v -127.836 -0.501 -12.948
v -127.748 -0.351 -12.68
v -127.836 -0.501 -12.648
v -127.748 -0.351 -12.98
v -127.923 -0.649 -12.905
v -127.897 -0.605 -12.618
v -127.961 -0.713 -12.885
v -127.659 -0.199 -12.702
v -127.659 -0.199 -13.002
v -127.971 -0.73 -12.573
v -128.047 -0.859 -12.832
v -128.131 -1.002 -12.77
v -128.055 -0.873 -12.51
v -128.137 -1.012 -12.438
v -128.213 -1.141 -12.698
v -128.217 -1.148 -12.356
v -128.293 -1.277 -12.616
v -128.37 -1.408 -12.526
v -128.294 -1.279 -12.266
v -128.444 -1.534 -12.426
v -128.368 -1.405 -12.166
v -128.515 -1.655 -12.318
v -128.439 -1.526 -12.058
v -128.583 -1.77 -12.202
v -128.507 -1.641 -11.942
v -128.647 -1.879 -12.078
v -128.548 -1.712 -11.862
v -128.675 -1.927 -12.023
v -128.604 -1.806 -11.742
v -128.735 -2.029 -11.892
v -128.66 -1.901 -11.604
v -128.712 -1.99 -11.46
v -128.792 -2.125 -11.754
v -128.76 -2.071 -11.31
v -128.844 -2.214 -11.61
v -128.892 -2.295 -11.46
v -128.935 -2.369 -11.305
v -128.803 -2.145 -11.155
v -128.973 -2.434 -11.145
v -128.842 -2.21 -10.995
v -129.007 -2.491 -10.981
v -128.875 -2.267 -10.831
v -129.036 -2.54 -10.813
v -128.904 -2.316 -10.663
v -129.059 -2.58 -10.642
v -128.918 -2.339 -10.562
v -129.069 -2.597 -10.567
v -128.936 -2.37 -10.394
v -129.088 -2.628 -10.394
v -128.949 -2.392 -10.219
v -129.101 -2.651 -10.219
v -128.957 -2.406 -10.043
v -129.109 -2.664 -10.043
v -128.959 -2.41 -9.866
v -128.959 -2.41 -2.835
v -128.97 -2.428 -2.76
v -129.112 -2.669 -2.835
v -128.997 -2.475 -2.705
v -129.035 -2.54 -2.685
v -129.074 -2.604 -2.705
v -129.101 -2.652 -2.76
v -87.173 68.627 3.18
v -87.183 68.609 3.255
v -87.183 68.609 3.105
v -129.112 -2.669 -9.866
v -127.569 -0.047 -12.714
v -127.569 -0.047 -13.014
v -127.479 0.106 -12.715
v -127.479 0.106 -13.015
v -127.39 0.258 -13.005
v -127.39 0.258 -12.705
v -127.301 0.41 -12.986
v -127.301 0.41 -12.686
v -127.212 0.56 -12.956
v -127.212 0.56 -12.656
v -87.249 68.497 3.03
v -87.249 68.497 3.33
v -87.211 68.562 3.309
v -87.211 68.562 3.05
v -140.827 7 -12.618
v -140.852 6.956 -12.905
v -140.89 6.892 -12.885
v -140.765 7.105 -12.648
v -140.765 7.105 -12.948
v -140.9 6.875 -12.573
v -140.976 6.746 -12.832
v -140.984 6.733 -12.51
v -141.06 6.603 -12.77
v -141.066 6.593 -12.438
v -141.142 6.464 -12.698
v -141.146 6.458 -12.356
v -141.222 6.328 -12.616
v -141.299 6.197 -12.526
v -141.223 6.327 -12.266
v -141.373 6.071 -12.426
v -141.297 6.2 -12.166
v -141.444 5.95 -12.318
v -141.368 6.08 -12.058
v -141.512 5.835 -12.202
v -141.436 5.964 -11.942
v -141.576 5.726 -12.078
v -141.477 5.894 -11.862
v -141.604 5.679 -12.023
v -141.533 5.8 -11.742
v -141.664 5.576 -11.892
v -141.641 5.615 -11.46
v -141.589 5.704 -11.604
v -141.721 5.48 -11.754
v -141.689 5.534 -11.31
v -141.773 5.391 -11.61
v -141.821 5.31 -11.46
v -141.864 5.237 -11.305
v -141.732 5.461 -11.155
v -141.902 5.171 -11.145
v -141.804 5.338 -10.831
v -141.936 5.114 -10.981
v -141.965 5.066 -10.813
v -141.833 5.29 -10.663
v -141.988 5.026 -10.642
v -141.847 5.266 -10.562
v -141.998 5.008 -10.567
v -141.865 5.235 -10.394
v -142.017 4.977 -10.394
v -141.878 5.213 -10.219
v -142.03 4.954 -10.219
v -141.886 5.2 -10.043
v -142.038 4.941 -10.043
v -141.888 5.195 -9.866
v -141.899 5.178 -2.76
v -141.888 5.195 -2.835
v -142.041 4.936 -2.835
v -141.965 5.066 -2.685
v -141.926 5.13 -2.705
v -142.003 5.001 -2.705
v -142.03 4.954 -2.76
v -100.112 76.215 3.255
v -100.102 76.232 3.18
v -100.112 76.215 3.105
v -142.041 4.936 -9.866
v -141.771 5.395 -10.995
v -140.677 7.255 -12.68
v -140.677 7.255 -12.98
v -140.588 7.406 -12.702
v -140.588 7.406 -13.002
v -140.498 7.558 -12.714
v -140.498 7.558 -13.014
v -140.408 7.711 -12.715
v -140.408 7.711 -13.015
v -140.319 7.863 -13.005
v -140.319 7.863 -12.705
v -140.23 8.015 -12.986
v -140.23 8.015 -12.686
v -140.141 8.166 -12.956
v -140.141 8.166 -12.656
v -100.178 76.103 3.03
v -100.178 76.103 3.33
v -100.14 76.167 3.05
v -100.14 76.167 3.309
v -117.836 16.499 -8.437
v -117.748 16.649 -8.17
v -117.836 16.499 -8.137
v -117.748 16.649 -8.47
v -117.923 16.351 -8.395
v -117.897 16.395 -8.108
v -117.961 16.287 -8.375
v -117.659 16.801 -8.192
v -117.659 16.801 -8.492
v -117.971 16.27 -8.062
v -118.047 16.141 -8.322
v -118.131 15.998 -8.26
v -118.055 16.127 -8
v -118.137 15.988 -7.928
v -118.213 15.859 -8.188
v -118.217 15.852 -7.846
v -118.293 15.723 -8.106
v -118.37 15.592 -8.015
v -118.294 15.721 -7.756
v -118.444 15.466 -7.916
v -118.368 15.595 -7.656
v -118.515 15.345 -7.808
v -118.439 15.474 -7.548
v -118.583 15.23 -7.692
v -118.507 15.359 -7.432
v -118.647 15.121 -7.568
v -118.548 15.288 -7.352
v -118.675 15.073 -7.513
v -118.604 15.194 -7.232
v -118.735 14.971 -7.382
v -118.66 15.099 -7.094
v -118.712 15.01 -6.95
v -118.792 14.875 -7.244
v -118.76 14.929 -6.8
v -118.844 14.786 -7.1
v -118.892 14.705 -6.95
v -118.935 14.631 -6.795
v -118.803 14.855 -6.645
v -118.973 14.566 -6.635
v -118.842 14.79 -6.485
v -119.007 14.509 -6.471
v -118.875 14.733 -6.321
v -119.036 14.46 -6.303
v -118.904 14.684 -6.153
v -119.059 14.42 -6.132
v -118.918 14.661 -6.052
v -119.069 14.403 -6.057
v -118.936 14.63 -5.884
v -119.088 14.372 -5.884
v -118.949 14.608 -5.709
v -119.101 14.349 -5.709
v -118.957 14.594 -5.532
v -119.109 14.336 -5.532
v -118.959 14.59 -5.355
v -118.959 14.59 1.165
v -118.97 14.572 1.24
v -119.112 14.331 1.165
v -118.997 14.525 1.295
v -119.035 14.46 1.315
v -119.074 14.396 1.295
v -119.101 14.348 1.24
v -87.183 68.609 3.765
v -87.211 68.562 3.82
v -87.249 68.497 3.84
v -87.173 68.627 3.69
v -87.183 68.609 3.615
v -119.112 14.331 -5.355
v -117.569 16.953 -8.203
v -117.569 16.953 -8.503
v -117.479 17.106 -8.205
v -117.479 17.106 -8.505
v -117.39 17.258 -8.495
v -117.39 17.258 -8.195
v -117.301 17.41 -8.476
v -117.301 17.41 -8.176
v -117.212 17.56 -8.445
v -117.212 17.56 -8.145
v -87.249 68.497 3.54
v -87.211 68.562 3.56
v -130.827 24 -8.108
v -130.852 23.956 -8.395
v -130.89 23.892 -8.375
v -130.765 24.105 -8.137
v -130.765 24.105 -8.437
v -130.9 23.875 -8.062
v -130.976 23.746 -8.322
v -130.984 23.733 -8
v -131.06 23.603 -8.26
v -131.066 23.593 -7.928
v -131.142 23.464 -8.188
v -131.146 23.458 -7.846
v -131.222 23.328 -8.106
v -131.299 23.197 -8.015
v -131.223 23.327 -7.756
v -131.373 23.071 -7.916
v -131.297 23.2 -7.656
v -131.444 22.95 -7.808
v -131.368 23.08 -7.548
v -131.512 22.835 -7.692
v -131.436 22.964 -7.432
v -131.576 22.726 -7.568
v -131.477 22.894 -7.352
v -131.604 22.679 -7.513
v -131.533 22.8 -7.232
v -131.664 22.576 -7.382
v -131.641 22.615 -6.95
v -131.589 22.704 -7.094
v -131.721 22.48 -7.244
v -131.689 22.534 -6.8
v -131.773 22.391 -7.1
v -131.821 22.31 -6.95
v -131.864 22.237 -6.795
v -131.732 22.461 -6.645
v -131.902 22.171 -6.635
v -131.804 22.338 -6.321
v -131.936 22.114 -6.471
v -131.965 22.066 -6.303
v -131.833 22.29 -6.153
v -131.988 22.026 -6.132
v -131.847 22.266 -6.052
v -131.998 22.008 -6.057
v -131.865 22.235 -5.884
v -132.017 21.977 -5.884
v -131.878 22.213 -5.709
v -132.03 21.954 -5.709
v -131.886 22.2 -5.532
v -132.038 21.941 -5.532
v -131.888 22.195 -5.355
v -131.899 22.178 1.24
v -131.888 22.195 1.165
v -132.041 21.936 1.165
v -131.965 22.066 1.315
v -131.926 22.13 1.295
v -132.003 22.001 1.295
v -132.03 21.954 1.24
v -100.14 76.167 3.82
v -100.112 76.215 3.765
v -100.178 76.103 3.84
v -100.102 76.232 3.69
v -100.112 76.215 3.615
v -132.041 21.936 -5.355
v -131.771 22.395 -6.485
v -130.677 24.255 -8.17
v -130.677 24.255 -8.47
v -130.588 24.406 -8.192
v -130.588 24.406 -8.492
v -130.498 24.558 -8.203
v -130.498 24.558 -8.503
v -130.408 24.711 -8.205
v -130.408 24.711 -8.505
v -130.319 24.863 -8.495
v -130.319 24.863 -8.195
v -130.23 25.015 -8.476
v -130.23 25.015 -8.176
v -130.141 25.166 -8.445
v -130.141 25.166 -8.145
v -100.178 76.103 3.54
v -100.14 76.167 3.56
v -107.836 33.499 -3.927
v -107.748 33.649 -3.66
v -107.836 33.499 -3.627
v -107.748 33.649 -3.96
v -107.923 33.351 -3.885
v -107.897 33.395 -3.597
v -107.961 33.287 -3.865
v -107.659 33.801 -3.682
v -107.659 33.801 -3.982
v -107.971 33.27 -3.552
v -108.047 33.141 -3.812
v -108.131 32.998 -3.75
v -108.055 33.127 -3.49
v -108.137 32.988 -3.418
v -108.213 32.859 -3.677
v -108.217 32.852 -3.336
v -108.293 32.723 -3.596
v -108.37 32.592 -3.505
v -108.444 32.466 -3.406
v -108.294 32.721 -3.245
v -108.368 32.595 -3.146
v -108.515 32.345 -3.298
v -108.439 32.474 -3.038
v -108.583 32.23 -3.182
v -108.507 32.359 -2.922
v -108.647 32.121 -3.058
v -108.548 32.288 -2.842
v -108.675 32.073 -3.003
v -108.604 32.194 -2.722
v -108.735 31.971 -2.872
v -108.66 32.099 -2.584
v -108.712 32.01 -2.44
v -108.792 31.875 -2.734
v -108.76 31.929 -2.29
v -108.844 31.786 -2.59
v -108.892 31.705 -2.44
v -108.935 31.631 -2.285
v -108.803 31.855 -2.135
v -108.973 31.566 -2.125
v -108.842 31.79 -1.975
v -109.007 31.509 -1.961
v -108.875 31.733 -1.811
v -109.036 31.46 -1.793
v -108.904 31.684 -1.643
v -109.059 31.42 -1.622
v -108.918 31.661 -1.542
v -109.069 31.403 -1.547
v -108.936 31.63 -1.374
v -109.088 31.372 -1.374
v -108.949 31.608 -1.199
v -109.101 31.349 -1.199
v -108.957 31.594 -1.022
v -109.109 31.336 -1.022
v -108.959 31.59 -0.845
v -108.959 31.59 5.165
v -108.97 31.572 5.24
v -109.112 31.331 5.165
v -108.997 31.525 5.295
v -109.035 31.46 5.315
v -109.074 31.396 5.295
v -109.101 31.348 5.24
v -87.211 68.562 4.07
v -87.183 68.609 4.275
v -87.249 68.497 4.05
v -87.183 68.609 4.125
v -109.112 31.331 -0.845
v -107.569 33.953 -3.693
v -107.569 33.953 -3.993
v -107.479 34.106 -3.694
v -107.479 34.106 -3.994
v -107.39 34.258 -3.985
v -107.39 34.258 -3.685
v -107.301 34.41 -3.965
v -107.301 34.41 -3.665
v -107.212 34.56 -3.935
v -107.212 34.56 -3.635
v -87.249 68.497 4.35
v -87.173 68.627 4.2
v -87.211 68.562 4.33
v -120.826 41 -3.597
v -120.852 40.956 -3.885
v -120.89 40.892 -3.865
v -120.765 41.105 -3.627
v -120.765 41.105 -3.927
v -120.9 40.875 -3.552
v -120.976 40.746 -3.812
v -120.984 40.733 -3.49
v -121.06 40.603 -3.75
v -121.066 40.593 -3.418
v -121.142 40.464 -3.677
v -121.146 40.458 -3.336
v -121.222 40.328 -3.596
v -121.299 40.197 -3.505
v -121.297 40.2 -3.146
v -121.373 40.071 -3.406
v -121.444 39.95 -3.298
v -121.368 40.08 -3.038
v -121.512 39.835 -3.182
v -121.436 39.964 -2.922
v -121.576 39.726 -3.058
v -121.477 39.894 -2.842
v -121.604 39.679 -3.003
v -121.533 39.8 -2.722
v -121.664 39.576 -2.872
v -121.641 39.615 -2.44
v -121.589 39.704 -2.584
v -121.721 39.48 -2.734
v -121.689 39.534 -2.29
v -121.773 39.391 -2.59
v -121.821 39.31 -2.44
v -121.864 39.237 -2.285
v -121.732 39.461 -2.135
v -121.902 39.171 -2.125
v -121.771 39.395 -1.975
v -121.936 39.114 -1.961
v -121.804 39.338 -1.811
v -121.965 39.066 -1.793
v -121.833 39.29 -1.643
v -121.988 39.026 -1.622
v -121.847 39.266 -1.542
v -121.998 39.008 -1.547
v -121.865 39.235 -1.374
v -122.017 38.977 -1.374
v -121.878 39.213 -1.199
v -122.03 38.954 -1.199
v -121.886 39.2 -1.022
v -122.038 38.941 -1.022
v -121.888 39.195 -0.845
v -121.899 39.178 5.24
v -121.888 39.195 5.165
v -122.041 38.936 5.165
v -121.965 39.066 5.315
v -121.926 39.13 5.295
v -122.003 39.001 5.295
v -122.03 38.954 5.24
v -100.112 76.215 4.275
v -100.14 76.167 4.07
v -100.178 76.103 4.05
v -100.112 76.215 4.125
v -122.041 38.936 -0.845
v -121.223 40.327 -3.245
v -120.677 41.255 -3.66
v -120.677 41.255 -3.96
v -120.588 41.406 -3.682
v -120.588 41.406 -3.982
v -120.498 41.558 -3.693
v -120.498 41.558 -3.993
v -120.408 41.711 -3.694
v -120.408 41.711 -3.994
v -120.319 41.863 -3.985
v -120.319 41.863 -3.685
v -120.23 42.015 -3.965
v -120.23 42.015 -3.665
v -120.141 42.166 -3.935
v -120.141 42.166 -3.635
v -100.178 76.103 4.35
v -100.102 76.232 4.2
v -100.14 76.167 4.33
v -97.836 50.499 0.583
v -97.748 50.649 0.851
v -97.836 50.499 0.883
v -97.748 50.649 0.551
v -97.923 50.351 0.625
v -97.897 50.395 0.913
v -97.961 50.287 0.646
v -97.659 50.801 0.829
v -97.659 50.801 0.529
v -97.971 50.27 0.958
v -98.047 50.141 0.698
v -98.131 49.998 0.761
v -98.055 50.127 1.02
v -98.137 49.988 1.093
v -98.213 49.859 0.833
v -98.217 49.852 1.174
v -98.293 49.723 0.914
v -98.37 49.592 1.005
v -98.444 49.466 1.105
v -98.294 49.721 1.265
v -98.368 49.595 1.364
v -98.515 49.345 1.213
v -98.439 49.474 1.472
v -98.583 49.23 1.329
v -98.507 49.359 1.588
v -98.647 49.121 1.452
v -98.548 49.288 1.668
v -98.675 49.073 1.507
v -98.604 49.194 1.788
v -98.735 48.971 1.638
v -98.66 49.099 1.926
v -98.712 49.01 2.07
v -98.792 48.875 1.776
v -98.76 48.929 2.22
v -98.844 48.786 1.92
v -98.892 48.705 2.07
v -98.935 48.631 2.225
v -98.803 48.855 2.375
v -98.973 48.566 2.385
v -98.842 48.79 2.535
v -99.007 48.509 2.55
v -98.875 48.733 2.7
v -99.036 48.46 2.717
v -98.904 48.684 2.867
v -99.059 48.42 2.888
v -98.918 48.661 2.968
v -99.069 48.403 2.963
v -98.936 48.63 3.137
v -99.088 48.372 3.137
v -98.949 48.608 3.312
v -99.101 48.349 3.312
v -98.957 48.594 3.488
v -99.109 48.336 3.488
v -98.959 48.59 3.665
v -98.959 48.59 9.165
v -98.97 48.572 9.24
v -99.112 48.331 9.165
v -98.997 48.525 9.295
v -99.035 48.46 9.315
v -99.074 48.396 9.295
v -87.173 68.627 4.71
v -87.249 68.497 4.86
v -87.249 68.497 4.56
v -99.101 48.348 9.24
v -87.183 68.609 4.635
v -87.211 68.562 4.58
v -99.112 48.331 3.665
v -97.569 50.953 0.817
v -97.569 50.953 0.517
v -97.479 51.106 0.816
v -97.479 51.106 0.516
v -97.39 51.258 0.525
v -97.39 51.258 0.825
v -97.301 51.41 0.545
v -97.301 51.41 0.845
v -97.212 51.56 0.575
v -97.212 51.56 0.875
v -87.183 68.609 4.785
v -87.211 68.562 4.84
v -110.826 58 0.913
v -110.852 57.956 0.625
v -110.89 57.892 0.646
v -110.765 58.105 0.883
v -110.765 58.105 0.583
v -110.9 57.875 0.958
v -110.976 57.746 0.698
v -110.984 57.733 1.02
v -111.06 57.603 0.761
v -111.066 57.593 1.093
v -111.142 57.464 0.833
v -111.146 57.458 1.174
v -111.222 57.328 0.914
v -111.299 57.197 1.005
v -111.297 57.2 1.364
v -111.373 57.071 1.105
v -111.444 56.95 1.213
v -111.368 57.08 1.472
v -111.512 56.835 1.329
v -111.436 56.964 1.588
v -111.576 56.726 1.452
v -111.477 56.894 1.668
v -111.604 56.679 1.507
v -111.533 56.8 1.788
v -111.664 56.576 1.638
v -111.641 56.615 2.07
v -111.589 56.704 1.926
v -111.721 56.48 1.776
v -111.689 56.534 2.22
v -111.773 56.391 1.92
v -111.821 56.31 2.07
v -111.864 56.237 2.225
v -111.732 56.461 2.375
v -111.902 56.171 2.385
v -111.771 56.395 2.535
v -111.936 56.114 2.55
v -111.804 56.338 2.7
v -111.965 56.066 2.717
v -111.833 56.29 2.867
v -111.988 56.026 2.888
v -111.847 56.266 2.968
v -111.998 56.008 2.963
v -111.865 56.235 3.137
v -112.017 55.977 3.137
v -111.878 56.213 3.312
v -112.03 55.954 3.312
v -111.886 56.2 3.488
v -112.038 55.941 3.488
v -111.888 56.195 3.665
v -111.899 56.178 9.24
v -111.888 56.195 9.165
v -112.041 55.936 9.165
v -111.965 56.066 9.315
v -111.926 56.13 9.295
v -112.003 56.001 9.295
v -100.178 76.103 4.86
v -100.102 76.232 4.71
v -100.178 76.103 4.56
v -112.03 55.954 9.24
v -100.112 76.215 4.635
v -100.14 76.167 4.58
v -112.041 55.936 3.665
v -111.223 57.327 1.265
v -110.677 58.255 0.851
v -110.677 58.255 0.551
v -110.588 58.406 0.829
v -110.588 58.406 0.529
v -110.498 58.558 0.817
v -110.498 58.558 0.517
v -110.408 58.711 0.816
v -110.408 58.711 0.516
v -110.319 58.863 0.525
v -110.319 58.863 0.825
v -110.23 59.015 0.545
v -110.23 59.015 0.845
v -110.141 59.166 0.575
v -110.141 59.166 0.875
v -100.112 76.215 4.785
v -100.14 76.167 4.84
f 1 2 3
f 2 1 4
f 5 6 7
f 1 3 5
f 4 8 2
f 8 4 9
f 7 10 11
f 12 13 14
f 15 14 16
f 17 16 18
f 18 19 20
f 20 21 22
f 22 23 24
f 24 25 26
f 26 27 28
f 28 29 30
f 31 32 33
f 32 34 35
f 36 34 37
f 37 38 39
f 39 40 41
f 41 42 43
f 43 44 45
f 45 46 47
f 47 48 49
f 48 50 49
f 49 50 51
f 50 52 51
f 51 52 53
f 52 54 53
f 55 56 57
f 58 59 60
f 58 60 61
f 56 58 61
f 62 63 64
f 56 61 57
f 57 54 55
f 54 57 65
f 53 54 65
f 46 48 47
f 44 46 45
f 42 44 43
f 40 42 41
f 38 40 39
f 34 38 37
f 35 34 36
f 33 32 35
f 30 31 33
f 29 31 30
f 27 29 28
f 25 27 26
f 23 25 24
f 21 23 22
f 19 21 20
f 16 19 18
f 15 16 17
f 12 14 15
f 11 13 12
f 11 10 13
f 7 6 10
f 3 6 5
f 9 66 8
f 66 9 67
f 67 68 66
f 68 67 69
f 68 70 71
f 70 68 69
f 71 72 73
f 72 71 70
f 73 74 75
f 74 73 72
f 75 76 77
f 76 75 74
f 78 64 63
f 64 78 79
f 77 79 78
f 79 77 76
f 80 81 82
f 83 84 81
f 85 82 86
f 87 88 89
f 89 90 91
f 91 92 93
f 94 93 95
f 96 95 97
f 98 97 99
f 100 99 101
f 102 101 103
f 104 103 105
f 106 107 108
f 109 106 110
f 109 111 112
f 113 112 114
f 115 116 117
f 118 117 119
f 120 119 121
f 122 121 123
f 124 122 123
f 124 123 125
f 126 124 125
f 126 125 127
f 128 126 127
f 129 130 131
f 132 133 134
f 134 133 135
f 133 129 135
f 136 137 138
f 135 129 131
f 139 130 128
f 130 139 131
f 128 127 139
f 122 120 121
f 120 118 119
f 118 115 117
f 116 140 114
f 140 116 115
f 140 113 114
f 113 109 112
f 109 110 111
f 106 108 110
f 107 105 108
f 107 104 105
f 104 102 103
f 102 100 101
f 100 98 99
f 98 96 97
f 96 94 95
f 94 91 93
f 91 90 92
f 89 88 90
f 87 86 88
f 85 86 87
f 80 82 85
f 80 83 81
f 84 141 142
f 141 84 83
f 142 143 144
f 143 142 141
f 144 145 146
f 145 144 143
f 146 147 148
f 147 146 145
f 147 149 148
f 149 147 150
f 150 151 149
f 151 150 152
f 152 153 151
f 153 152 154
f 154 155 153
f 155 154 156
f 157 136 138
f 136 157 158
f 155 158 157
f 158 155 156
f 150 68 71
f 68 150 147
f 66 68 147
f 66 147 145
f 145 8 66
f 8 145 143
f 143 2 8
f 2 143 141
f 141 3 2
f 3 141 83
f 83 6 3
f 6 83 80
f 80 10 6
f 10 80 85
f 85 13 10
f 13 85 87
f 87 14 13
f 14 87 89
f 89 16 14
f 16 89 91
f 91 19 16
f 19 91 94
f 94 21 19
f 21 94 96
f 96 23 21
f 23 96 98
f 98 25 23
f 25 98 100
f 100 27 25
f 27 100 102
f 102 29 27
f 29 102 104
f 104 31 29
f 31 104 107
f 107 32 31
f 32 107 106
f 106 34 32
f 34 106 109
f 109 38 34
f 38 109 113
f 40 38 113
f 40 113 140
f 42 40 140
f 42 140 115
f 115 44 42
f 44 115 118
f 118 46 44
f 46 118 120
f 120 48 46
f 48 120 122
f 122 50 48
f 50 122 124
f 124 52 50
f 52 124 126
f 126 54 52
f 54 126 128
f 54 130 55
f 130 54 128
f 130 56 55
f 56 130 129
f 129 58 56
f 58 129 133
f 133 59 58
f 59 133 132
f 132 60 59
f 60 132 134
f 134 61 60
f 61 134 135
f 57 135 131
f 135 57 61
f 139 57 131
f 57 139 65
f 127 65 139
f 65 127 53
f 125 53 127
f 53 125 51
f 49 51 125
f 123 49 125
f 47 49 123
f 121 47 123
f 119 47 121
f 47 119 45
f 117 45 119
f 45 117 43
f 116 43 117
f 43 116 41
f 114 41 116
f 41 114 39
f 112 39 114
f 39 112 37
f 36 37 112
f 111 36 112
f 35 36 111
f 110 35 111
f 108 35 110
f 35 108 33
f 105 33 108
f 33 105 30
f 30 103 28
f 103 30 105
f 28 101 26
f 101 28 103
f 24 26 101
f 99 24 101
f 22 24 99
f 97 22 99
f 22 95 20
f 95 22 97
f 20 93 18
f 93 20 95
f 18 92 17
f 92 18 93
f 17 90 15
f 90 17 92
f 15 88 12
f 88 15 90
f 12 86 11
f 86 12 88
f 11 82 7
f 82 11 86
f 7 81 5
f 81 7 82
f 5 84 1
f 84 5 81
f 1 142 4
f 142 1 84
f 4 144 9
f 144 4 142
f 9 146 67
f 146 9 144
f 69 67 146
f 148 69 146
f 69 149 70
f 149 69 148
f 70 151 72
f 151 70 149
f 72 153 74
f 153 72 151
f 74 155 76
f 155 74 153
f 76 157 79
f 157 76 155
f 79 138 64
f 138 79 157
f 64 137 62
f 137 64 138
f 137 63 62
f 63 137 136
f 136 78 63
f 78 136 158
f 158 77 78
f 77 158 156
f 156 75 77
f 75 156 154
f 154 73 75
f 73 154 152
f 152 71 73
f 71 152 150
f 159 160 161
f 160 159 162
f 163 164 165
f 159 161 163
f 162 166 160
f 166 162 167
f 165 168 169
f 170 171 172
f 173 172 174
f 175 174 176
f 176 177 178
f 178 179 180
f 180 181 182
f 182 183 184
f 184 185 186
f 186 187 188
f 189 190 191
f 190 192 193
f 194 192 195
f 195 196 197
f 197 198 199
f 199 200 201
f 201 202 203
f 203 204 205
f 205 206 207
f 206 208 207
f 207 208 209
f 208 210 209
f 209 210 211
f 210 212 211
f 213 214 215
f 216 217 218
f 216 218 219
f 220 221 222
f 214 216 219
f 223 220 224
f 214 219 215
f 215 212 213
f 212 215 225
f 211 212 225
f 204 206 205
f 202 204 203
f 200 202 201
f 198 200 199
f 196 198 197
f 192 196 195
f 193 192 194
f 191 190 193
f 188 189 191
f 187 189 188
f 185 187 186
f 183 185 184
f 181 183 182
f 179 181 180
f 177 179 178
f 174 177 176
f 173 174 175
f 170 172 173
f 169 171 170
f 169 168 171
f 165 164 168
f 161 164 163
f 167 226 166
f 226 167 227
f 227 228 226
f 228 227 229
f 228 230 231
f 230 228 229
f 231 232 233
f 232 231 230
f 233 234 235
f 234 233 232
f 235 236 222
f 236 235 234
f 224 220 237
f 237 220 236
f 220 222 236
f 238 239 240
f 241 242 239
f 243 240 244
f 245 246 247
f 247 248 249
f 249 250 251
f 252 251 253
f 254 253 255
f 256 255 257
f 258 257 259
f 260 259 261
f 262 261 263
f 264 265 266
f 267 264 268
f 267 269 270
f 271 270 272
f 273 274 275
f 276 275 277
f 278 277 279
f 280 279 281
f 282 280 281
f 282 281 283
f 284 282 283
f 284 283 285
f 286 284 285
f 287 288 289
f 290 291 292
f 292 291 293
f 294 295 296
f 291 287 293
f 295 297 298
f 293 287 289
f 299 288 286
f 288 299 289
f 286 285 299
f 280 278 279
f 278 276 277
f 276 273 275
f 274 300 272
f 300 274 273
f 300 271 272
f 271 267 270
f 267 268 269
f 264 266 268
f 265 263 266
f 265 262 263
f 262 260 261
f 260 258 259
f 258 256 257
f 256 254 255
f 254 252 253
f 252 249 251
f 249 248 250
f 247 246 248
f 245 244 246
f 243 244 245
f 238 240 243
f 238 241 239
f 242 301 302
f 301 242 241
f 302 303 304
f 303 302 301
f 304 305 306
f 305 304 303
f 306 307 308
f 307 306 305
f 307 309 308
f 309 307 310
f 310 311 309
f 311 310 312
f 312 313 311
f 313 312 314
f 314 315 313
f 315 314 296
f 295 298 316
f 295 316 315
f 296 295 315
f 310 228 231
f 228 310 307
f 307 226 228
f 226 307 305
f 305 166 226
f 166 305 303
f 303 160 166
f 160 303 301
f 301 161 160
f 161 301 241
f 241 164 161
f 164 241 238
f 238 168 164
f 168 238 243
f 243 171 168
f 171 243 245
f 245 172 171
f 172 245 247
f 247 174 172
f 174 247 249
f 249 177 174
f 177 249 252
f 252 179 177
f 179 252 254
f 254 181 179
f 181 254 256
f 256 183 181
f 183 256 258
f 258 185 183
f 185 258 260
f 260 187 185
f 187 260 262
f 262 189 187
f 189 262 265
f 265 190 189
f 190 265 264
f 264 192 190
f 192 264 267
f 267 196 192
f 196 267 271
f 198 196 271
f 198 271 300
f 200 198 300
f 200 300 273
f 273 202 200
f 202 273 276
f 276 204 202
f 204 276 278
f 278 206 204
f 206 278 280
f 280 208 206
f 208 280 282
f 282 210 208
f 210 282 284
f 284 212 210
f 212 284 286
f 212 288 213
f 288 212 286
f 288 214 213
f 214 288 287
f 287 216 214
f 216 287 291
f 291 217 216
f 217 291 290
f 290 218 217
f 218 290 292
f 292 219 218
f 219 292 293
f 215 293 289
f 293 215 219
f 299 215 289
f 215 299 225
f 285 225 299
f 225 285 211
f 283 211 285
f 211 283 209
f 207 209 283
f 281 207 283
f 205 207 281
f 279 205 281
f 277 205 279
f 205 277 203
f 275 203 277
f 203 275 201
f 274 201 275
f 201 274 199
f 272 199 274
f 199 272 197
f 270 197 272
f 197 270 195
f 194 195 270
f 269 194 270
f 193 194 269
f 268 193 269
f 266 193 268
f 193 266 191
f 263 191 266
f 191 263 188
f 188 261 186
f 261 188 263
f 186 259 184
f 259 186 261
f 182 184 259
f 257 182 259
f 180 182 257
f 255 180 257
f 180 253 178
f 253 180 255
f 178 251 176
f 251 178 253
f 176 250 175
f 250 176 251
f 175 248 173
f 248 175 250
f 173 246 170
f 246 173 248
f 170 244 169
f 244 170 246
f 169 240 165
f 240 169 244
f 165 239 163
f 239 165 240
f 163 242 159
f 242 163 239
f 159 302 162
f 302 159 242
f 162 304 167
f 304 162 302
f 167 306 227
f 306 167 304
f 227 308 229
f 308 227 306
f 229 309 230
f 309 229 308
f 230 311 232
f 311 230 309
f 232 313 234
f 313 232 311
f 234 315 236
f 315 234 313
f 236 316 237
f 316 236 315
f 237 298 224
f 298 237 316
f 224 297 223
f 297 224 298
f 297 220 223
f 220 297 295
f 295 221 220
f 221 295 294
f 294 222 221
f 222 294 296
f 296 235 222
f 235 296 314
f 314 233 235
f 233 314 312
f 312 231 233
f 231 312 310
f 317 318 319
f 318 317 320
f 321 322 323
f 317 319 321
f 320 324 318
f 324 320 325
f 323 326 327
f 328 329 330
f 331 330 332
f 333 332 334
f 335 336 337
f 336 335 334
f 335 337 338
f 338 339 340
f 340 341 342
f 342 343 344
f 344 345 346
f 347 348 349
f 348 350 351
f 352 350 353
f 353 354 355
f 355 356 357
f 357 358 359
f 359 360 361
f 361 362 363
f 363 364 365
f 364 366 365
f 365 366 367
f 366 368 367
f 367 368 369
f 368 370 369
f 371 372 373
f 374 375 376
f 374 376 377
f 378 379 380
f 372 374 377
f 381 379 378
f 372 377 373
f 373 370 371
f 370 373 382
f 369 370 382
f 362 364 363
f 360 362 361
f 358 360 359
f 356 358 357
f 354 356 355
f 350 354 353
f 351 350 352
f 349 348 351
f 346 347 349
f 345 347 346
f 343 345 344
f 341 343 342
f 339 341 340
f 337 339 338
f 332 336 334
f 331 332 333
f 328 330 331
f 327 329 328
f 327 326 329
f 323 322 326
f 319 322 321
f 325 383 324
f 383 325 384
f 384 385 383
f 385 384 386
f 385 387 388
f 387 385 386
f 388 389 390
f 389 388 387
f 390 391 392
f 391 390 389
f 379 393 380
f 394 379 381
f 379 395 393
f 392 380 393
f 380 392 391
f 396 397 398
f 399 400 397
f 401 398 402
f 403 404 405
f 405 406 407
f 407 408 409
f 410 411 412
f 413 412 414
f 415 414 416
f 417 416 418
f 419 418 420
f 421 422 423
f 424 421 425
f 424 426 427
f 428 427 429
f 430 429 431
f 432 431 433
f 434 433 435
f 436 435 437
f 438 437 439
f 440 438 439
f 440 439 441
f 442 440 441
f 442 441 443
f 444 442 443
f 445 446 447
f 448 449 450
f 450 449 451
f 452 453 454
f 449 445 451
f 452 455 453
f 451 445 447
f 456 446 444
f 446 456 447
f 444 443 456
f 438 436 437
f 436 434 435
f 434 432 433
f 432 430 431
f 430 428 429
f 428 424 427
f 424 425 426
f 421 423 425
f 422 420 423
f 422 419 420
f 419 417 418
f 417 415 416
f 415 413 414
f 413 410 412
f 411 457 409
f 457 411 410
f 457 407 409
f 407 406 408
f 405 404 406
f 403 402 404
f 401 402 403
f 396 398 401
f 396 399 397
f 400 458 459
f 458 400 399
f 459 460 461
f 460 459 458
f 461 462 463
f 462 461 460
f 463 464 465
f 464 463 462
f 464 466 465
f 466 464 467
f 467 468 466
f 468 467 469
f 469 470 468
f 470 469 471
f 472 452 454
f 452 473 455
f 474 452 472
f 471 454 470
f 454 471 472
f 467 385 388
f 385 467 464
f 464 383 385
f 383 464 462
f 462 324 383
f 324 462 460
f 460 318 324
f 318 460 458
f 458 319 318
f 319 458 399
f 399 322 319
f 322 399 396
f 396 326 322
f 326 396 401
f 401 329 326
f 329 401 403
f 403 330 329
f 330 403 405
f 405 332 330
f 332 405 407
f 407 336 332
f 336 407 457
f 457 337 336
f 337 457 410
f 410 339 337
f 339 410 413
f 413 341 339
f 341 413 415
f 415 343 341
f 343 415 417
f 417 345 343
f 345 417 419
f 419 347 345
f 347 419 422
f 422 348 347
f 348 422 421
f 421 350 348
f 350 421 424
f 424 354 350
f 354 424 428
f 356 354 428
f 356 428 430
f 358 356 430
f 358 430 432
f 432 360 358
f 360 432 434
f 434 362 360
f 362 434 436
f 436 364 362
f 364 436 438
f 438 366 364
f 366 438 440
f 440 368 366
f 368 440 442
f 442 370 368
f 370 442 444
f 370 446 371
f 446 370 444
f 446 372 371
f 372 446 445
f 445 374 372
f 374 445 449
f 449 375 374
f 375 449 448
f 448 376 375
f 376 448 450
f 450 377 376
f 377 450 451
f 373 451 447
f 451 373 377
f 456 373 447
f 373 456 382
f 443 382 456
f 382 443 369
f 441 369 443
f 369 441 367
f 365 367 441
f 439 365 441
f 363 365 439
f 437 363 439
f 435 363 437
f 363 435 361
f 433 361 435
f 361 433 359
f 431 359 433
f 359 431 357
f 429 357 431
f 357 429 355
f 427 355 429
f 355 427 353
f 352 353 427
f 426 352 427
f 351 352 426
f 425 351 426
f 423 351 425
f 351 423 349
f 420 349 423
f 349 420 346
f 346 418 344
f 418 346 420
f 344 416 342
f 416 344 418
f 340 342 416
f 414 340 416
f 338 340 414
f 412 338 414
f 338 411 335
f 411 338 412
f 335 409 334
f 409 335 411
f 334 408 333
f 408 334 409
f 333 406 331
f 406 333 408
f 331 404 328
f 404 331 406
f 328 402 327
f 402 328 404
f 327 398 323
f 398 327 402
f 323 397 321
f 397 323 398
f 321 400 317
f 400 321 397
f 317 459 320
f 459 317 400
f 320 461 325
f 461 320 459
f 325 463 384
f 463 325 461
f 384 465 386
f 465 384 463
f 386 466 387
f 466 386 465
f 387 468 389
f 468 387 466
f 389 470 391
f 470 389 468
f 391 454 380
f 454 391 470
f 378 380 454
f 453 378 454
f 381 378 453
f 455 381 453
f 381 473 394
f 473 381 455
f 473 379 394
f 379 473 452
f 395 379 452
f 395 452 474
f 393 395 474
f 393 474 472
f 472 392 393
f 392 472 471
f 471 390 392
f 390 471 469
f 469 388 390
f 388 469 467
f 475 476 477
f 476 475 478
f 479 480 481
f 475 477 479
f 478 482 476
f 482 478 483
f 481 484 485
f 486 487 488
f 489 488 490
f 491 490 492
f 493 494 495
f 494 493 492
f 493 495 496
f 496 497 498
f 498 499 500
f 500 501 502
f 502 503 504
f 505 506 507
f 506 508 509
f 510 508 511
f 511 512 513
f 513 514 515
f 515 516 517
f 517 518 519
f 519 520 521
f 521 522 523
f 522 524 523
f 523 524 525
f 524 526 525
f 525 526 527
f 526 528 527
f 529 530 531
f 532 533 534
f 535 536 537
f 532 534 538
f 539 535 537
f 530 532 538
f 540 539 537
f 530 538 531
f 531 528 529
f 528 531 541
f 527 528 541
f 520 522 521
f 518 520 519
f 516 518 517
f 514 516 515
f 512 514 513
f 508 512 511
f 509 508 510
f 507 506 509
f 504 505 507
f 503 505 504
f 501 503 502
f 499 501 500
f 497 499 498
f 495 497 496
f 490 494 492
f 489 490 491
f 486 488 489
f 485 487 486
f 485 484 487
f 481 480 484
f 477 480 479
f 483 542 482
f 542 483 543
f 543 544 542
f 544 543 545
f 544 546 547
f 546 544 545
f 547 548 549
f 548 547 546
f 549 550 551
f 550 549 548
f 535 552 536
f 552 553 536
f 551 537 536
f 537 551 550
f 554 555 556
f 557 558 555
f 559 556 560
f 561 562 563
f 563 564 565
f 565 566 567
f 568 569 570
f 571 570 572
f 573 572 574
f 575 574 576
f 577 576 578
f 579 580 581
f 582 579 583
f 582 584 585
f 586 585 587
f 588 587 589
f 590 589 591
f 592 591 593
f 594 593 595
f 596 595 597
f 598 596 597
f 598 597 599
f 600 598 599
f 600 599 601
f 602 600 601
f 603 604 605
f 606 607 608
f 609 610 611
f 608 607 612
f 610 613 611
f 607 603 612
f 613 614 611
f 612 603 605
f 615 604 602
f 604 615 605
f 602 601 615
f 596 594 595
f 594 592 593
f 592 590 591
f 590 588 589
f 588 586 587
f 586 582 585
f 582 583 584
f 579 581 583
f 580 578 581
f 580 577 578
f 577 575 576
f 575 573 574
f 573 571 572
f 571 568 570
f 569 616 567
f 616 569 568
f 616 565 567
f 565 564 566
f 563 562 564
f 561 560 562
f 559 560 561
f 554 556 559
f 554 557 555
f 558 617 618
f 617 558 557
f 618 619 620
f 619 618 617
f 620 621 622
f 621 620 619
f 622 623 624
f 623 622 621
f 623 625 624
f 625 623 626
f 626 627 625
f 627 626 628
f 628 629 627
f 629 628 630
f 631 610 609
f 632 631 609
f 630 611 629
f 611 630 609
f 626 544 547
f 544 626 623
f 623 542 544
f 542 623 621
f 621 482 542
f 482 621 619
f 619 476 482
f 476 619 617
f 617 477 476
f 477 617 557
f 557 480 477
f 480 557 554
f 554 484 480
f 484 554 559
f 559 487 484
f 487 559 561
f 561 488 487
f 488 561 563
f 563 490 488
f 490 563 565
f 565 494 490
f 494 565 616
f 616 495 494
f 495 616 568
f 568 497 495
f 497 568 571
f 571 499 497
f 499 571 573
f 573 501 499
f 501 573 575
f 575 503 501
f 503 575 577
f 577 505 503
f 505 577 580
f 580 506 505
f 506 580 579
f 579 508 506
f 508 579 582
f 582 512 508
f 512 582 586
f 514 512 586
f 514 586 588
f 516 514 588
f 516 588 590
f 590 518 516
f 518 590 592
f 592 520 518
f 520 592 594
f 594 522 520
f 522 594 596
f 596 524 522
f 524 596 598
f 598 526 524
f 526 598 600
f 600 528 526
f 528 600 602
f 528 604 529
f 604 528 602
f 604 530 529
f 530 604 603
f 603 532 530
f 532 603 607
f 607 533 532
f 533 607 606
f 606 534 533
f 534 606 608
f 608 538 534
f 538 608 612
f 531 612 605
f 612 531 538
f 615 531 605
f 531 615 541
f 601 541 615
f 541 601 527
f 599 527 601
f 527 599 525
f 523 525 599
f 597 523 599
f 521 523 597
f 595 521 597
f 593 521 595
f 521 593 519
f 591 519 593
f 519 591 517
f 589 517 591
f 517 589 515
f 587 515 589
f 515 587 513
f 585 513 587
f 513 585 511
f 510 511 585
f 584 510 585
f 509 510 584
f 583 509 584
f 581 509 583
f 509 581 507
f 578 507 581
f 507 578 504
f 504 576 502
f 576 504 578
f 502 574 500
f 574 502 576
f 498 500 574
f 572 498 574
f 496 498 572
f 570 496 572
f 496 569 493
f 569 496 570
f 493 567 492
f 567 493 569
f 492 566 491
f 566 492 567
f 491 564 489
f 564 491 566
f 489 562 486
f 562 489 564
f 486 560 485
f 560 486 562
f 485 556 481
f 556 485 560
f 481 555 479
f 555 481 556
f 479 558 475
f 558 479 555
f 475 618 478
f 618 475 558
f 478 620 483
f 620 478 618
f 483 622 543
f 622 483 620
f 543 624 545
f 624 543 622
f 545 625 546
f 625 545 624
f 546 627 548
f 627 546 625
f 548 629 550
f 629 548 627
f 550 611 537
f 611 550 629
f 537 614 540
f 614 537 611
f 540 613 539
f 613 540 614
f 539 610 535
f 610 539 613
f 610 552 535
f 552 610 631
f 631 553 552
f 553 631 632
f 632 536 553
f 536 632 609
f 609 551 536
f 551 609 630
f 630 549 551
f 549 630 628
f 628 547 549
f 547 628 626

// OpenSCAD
// The boards' FFCs to the outlet in the back of the housing
//
// The simplest route: each cable leaves its board's connector straight down,
// is bent once about its width towards its normal, and runs straight from
// there through an outlet in the housing's back face. No further bending.
//
// All four connectors lie in one vertical plane, each the one before moved by
// a staircase step (10, 17, 4), which runs exactly along the straight parts.
// So the four cables lie on one another: board 0's lowest, each next one
// stack_pitch higher (measured square to the cables), the same bend for all;
// only the straight lead below each connector differs, the top cable (board
// 3's) keeping lead. Each cable comes down onto the ones below it from above
// (a bend stays above its own straight part), so none crosses another.
//
// The connector stands square to the housing's slanted -x face (pcb.scad):
// its long side, so the cable's width, lies along that face's normal. The
// cable's normal then points along the face, towards the back (+x, +y), so
// after the bend it runs parallel to the slanted face, in the vertical plane
// through the connector's centre, along the hole behind that face (see
// housing.scad). The bend is 90 deg plus the rise of the housing's bottom
// along that direction (11.5 deg): straight on, the cable stays parallel to
// the hole's floor, 3.8 mm above it, below the connectors (5.3 mm), screw
// bosses and ribs (3.8 mm) of boards 1-3, beside the hole-1 guide tubes
// (0.8 mm in plan). (At exactly 90 deg it would run level and leave through
// the rising bottom under board 2 instead of the back face.) It meets row 3's
// back wall obliquely, 30.5 deg off its normal: a flat cable cannot turn in
// its own plane.
//
// Coordinates: board 0's frame, as everywhere.
//
// Render with  openscad -o back_cable.stl back_cable.scad   (the cable)
// housing.scad uses back_outlet() for the hole in the back wall.
// Figures in the description above are for board 0's cable before the stack;
// it now runs (n_cables - 1) * stack_pitch lower, the top one there.

/* [From pcb.scad / housing.scad, do not edit here] */
step     = [10, 17, 4];          // staircase
con_c    = [-135.5, 1.2631];     // board 0's connector centre
con_rot  = atan2(step[1], step[0]);   // turned from y towards -x
face_z   = -0.835 - 5.5;         // connector face: bottom copper - body height
slope    = step[2] / step[1];    // the housing's bottom rises with the staircase
back_y   = 3 * step[1] + 10.6 + 0.7;   // housing's back face behind board 3 (cover outline)
back_t   = 1.2;                  // its wall round the hole

/* [Cable: 14-way FFC, 1.0 mm pitch] */
ffc_w    = 15;                   // width
ffc_t    = 0.3;                  // thickness
insert   = 3.5;                  // inside the connector
lead     = 2;                    // straight below the connector face (stiffener)
bend_r   = 3;                    // bend radius, at the cable's centre (rMin 2)
tail     = 10;                   // beyond the back face, along y
n_cables = 4;                    // boards 0 .. 3
stack_pitch = 0.5;               // cable to cable, square to them: 0.2 between the films

/* [Outlet] */
outlet_w = ffc_w + 1;            // hole in the back wall: 0.5 beside the cable each side
outlet_h = (n_cables - 1) * stack_pitch + ffc_t + 2 * 0.85;   //   and 0.85 above and below the stack

$fa = 2; $fs = 0.2;

// the cable's plane: x' along its run in plan (the cable's normal at the
// connector), y' = z; the width lies along u (towards contact 1)
run  = [cos(con_rot), sin(con_rot)];        // in plan, towards the back
u    = [-sin(con_rot), cos(con_rot)];
rise = atan(slope * run[1]);                 // the bottom's rise along run
bend = 90 + rise;                            // turned by this from straight down
dir    = [cos(rise), sin(rise)];             // straight on, after the bend
nrm    = [-sin(rise), cos(rise)];            // square to it, up
// cable k in its own board's frame, (x', z'), from inside the connector:
// its lead puts it (n_cables - 1 - k) * stack_pitch below the top one
function lead_of(k) = lead + (n_cables - 1 - k) * stack_pitch / cos(rise);
function arc_c(k) = [bend_r, face_z - lead_of(k)];
function arc_pt(k, a) = arc_c(k) + bend_r * [-cos(a), -sin(a)];   // a = 0 at the lead's end
function p_arc(k) = arc_pt(k, bend);
// straight part: to tail beyond the back face (along y)
function x_back(k) = (back_y - k * step[1] - con_c[1]) / run[1];   // x' where it meets the back face
function s_end(k) = (x_back(k) + tail / run[1] - p_arc(k)[0]) / dir[0];
function p_end(k) = p_arc(k) + s_end(k) * dir;
function at(k, q) = [con_c[0] + q[0] * run[0], con_c[1] + q[0] * run[1], q[1]] + k * step;   // -> board 0's frame
function z_back(k) = p_arc(k)[1] + (x_back(k) - p_arc(k)[0]) * dir[1] / dir[0];

for (k = [0 : n_cables - 1])
    echo(str("cable ", k, ": lead ", lead_of(k), ", bend ", bend, " deg (R ", bend_r, "), then straight at ", rise,
             " deg; leaves the back face at ", at(k, [x_back(k), z_back(k)]), "; free length ",
             lead_of(k) + bend_r * bend * PI / 180 + s_end(k), " mm from the connector face"));

// the plane of the cable, (x', z') in it, extruded along u by the width
module in_plane(k)
    translate(k * step)
    multmatrix([[run[0], 0, u[0], con_c[0]],
                [run[1], 0, u[1], con_c[1]],
                [0,      1, 0,    0],
                [0,      0, 0,    1]])
        children();

module centre_line2d(k)
    union() {
        hull() { translate([0, face_z + insert]) circle(d = ffc_t, $fn = 12);
                 translate([0, face_z - lead_of(k)]) circle(d = ffc_t, $fn = 12); }
        for (i = [0 : 29]) hull() {
            translate(arc_pt(k, bend * i / 30)) circle(d = ffc_t, $fn = 12);
            translate(arc_pt(k, bend * (i + 1) / 30)) circle(d = ffc_t, $fn = 12);
        }
        hull() { translate(p_arc(k)) circle(d = ffc_t, $fn = 12); translate(p_end(k)) circle(d = ffc_t, $fn = 12); }
    }

module back_cable(k)
    in_plane(k) translate([0, 0, -ffc_w / 2]) linear_extrude(ffc_w) centre_line2d(k);

module back_cables() for (k = [0 : n_cables - 1]) back_cable(k);

// the outlet: a slot along the straight parts, round the whole stack, from
// just inside the hole until past the back face, outlet_w across and
// outlet_h through
module back_outlet()
    in_plane(0) translate(p_arc(0) + (n_cables - 1) / 2 * stack_pitch * nrm) rotate(rise)
        translate([(x_back(0) - p_arc(0)[0]) / dir[0] - 15, -outlet_h / 2, -outlet_w / 2])
            cube([30, outlet_h, outlet_w]);

back_cables();
